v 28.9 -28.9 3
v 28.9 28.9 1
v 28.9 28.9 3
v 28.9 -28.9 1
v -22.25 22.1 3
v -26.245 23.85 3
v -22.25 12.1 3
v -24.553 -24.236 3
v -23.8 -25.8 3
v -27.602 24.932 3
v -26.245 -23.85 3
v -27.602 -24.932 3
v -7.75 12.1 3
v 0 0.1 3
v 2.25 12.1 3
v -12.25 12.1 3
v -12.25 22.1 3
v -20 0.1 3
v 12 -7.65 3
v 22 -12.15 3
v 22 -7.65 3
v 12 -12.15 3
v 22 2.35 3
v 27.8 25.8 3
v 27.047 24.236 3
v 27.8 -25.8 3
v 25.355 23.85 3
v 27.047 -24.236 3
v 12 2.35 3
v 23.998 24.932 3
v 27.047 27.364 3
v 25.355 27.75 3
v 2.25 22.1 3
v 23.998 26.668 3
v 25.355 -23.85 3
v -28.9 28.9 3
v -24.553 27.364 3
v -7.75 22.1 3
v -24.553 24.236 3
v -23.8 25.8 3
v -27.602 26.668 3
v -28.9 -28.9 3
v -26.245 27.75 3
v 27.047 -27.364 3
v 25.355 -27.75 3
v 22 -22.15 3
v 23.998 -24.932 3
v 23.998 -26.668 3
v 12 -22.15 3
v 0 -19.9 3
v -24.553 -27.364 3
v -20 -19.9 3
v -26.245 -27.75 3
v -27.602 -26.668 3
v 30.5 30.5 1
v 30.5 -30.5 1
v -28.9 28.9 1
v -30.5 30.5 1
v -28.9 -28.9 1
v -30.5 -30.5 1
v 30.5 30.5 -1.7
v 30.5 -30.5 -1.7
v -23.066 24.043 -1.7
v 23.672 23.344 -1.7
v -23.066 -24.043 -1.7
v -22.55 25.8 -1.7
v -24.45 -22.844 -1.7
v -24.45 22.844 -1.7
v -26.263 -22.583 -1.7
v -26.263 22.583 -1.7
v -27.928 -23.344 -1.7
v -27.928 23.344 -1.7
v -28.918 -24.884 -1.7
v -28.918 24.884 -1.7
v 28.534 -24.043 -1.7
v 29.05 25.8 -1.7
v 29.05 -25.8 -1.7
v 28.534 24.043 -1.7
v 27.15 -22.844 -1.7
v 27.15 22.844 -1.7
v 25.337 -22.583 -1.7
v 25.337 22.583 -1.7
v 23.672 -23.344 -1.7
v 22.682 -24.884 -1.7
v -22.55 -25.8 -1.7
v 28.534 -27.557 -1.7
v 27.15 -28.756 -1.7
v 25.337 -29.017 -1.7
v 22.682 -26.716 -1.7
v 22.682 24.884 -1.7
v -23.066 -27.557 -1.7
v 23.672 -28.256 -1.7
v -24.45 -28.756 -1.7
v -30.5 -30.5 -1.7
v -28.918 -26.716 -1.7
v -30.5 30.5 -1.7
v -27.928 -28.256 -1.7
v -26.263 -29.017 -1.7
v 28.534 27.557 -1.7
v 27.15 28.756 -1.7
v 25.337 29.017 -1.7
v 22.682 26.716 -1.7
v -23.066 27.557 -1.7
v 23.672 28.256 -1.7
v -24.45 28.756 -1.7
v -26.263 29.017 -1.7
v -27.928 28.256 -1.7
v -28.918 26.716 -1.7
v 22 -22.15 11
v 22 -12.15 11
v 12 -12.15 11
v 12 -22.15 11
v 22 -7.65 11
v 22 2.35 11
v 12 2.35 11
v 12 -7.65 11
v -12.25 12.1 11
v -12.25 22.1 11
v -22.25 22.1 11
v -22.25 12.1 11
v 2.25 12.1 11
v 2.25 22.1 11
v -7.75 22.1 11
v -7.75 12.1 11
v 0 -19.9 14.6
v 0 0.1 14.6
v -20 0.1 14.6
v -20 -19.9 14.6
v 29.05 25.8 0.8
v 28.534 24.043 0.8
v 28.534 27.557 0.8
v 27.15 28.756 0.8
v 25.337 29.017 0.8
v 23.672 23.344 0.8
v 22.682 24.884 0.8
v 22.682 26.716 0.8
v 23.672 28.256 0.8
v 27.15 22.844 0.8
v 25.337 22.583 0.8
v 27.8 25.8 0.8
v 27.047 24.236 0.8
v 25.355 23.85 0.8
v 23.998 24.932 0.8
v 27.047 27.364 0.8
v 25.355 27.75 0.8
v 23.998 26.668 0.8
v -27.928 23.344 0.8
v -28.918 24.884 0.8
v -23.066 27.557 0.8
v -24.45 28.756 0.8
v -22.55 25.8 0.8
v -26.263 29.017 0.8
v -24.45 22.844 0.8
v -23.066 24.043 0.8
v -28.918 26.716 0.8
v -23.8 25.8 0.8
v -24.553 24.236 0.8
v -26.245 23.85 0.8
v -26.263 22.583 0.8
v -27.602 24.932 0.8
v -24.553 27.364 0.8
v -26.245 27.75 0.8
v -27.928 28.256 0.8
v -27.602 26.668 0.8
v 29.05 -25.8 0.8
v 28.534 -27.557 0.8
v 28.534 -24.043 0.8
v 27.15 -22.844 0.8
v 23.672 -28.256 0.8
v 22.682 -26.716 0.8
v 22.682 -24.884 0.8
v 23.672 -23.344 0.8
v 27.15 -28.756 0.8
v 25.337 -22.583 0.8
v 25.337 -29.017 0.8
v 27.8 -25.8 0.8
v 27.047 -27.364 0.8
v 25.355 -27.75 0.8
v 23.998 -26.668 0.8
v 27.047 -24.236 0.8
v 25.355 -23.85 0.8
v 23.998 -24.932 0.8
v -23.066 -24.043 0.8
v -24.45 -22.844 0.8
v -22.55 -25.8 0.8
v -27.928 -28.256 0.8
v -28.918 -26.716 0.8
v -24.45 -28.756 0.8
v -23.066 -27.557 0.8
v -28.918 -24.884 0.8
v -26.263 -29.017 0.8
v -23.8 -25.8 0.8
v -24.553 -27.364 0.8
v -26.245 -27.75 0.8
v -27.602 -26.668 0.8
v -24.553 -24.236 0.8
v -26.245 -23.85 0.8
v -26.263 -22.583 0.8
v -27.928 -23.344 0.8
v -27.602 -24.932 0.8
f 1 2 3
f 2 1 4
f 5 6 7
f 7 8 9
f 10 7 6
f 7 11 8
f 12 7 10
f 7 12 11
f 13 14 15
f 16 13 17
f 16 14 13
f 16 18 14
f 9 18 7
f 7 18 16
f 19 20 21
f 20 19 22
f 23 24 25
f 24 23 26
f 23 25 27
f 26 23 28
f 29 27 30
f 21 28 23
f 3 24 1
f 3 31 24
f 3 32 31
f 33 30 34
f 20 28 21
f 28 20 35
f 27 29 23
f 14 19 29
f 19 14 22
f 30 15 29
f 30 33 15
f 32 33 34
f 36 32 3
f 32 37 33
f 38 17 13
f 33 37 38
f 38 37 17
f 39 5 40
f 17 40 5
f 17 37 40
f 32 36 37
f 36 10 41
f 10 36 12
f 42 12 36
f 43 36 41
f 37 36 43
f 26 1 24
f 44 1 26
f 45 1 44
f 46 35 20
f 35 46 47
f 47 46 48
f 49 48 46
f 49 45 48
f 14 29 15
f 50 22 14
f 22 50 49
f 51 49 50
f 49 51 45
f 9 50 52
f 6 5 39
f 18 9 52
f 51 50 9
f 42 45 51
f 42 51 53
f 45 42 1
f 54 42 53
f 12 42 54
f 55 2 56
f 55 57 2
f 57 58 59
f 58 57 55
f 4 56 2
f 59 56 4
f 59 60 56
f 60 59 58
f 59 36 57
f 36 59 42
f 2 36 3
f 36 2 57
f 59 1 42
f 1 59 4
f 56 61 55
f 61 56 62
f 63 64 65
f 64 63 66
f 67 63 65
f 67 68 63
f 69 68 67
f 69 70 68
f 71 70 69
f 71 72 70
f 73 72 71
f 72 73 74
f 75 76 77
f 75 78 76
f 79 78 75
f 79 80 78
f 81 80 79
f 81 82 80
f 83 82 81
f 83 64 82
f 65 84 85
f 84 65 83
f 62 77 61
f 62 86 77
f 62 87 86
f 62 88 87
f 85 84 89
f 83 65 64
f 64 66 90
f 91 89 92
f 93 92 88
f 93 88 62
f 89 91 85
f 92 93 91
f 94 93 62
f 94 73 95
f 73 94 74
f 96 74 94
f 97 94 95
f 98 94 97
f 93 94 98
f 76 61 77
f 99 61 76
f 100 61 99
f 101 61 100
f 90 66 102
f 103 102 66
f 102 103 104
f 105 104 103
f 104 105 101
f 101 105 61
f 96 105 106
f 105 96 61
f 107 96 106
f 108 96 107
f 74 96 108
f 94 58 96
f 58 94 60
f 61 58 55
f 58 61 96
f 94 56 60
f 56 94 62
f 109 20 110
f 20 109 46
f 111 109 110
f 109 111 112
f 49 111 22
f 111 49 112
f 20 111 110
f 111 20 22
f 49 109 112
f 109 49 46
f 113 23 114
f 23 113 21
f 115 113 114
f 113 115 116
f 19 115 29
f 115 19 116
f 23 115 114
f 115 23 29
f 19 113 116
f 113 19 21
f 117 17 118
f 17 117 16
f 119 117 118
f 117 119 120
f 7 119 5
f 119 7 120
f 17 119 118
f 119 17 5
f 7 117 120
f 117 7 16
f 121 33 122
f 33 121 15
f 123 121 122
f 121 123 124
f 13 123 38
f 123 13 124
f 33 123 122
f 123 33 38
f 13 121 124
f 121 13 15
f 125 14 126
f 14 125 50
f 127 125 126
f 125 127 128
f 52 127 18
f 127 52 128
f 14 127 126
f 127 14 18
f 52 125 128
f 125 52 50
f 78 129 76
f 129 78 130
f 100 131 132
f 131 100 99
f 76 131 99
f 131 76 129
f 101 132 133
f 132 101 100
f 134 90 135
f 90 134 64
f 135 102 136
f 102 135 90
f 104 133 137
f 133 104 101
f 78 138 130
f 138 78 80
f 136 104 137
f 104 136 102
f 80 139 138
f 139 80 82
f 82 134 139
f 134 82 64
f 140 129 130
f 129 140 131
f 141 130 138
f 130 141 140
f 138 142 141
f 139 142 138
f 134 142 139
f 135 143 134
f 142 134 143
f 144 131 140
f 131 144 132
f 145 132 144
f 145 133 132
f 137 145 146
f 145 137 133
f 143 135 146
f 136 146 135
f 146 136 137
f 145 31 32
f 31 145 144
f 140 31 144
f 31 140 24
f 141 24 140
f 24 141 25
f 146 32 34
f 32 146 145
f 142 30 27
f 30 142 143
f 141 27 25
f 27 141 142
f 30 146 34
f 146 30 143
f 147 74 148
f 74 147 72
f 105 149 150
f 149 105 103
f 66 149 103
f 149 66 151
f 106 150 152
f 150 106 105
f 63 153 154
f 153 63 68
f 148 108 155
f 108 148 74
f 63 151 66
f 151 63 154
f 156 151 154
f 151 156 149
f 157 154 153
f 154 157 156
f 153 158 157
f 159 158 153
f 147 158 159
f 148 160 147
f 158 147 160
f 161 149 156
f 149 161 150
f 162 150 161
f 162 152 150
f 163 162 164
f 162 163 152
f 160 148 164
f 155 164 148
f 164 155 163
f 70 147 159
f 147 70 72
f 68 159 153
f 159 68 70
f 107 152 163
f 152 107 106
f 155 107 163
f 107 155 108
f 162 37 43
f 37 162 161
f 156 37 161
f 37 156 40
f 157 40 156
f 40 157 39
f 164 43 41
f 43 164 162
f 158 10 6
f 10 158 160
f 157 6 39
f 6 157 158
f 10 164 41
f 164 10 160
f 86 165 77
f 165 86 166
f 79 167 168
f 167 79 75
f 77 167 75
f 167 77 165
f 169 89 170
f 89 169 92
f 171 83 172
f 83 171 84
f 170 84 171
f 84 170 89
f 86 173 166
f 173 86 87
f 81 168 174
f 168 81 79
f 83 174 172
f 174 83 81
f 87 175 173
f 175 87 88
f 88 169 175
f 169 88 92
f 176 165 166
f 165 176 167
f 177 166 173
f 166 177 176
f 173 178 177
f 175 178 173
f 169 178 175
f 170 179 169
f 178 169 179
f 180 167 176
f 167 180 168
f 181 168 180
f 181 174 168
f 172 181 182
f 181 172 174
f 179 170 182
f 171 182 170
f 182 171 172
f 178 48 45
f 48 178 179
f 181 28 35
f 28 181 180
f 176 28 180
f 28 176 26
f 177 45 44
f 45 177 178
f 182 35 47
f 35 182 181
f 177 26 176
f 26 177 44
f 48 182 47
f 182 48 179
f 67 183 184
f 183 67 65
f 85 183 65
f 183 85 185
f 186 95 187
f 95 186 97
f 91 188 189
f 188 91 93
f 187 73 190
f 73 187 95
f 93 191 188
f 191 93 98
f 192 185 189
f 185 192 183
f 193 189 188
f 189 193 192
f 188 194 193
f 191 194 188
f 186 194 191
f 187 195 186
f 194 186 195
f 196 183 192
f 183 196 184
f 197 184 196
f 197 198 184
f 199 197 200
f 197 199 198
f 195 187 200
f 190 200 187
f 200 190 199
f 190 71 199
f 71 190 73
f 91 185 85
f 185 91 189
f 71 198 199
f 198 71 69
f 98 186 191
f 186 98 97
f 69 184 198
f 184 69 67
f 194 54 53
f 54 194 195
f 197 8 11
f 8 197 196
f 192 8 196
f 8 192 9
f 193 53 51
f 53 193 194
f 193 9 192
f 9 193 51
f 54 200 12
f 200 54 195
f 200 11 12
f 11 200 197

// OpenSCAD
difference(){
    union(){
        translate([0, 0, 2])cube([57.8, 57.8, 2], center = true); // Base top
        translate([0, 0, -0.35])cube([61, 61, 2.7], center = true); // Base bottom
        translate([17.0, -17.15, 7])cube([10,10,8], center = true); // Support Button Minus
        translate([17.0, -2.65, 7])cube([10,10,8], center = true); // Support Button Plus
        translate([-17.25, 17.1, 7])cube([10,10,8], center = true); // Support Button Off
        translate([-2.75, 17.1, 7])cube([10,10,8], center = true); // Support Button Reset
        translate([-10, -9.9, 8.8])cube([20,20,11.6], center = true); // Support Display
        
    }
    //Verschraubung
    translate([25.8, 25.8, -0.45])cylinder( h = 2.5, d = 6.5, center = true); // rechts oben
    translate([25.8, 25.8, 1.9])cylinder( h = 2.2, d = 4, center = true); // rechts oben
    translate([-25.8, 25.8, -0.45])cylinder( h = 2.5, d = 6.5, center = true); // links oben
    translate([-25.8, 25.8, 1.9])cylinder( h = 2.2, d = 4, center = true); // links oben
    translate([25.8, -25.8, -0.45])cylinder( h = 2.5, d = 6.5, center = true); // rechts unten
    translate([25.8, -25.8, 1.9])cylinder( h = 2.2, d = 4, center = true); // rechts unten
    translate([-25.8, -25.8, -0.45])cylinder( h = 2.5, d = 6.5, center = true); // links unten
    translate([-25.8, -25.8, 1.9])cylinder( h = 2.2, d = 4, center = true); // links unten
}
